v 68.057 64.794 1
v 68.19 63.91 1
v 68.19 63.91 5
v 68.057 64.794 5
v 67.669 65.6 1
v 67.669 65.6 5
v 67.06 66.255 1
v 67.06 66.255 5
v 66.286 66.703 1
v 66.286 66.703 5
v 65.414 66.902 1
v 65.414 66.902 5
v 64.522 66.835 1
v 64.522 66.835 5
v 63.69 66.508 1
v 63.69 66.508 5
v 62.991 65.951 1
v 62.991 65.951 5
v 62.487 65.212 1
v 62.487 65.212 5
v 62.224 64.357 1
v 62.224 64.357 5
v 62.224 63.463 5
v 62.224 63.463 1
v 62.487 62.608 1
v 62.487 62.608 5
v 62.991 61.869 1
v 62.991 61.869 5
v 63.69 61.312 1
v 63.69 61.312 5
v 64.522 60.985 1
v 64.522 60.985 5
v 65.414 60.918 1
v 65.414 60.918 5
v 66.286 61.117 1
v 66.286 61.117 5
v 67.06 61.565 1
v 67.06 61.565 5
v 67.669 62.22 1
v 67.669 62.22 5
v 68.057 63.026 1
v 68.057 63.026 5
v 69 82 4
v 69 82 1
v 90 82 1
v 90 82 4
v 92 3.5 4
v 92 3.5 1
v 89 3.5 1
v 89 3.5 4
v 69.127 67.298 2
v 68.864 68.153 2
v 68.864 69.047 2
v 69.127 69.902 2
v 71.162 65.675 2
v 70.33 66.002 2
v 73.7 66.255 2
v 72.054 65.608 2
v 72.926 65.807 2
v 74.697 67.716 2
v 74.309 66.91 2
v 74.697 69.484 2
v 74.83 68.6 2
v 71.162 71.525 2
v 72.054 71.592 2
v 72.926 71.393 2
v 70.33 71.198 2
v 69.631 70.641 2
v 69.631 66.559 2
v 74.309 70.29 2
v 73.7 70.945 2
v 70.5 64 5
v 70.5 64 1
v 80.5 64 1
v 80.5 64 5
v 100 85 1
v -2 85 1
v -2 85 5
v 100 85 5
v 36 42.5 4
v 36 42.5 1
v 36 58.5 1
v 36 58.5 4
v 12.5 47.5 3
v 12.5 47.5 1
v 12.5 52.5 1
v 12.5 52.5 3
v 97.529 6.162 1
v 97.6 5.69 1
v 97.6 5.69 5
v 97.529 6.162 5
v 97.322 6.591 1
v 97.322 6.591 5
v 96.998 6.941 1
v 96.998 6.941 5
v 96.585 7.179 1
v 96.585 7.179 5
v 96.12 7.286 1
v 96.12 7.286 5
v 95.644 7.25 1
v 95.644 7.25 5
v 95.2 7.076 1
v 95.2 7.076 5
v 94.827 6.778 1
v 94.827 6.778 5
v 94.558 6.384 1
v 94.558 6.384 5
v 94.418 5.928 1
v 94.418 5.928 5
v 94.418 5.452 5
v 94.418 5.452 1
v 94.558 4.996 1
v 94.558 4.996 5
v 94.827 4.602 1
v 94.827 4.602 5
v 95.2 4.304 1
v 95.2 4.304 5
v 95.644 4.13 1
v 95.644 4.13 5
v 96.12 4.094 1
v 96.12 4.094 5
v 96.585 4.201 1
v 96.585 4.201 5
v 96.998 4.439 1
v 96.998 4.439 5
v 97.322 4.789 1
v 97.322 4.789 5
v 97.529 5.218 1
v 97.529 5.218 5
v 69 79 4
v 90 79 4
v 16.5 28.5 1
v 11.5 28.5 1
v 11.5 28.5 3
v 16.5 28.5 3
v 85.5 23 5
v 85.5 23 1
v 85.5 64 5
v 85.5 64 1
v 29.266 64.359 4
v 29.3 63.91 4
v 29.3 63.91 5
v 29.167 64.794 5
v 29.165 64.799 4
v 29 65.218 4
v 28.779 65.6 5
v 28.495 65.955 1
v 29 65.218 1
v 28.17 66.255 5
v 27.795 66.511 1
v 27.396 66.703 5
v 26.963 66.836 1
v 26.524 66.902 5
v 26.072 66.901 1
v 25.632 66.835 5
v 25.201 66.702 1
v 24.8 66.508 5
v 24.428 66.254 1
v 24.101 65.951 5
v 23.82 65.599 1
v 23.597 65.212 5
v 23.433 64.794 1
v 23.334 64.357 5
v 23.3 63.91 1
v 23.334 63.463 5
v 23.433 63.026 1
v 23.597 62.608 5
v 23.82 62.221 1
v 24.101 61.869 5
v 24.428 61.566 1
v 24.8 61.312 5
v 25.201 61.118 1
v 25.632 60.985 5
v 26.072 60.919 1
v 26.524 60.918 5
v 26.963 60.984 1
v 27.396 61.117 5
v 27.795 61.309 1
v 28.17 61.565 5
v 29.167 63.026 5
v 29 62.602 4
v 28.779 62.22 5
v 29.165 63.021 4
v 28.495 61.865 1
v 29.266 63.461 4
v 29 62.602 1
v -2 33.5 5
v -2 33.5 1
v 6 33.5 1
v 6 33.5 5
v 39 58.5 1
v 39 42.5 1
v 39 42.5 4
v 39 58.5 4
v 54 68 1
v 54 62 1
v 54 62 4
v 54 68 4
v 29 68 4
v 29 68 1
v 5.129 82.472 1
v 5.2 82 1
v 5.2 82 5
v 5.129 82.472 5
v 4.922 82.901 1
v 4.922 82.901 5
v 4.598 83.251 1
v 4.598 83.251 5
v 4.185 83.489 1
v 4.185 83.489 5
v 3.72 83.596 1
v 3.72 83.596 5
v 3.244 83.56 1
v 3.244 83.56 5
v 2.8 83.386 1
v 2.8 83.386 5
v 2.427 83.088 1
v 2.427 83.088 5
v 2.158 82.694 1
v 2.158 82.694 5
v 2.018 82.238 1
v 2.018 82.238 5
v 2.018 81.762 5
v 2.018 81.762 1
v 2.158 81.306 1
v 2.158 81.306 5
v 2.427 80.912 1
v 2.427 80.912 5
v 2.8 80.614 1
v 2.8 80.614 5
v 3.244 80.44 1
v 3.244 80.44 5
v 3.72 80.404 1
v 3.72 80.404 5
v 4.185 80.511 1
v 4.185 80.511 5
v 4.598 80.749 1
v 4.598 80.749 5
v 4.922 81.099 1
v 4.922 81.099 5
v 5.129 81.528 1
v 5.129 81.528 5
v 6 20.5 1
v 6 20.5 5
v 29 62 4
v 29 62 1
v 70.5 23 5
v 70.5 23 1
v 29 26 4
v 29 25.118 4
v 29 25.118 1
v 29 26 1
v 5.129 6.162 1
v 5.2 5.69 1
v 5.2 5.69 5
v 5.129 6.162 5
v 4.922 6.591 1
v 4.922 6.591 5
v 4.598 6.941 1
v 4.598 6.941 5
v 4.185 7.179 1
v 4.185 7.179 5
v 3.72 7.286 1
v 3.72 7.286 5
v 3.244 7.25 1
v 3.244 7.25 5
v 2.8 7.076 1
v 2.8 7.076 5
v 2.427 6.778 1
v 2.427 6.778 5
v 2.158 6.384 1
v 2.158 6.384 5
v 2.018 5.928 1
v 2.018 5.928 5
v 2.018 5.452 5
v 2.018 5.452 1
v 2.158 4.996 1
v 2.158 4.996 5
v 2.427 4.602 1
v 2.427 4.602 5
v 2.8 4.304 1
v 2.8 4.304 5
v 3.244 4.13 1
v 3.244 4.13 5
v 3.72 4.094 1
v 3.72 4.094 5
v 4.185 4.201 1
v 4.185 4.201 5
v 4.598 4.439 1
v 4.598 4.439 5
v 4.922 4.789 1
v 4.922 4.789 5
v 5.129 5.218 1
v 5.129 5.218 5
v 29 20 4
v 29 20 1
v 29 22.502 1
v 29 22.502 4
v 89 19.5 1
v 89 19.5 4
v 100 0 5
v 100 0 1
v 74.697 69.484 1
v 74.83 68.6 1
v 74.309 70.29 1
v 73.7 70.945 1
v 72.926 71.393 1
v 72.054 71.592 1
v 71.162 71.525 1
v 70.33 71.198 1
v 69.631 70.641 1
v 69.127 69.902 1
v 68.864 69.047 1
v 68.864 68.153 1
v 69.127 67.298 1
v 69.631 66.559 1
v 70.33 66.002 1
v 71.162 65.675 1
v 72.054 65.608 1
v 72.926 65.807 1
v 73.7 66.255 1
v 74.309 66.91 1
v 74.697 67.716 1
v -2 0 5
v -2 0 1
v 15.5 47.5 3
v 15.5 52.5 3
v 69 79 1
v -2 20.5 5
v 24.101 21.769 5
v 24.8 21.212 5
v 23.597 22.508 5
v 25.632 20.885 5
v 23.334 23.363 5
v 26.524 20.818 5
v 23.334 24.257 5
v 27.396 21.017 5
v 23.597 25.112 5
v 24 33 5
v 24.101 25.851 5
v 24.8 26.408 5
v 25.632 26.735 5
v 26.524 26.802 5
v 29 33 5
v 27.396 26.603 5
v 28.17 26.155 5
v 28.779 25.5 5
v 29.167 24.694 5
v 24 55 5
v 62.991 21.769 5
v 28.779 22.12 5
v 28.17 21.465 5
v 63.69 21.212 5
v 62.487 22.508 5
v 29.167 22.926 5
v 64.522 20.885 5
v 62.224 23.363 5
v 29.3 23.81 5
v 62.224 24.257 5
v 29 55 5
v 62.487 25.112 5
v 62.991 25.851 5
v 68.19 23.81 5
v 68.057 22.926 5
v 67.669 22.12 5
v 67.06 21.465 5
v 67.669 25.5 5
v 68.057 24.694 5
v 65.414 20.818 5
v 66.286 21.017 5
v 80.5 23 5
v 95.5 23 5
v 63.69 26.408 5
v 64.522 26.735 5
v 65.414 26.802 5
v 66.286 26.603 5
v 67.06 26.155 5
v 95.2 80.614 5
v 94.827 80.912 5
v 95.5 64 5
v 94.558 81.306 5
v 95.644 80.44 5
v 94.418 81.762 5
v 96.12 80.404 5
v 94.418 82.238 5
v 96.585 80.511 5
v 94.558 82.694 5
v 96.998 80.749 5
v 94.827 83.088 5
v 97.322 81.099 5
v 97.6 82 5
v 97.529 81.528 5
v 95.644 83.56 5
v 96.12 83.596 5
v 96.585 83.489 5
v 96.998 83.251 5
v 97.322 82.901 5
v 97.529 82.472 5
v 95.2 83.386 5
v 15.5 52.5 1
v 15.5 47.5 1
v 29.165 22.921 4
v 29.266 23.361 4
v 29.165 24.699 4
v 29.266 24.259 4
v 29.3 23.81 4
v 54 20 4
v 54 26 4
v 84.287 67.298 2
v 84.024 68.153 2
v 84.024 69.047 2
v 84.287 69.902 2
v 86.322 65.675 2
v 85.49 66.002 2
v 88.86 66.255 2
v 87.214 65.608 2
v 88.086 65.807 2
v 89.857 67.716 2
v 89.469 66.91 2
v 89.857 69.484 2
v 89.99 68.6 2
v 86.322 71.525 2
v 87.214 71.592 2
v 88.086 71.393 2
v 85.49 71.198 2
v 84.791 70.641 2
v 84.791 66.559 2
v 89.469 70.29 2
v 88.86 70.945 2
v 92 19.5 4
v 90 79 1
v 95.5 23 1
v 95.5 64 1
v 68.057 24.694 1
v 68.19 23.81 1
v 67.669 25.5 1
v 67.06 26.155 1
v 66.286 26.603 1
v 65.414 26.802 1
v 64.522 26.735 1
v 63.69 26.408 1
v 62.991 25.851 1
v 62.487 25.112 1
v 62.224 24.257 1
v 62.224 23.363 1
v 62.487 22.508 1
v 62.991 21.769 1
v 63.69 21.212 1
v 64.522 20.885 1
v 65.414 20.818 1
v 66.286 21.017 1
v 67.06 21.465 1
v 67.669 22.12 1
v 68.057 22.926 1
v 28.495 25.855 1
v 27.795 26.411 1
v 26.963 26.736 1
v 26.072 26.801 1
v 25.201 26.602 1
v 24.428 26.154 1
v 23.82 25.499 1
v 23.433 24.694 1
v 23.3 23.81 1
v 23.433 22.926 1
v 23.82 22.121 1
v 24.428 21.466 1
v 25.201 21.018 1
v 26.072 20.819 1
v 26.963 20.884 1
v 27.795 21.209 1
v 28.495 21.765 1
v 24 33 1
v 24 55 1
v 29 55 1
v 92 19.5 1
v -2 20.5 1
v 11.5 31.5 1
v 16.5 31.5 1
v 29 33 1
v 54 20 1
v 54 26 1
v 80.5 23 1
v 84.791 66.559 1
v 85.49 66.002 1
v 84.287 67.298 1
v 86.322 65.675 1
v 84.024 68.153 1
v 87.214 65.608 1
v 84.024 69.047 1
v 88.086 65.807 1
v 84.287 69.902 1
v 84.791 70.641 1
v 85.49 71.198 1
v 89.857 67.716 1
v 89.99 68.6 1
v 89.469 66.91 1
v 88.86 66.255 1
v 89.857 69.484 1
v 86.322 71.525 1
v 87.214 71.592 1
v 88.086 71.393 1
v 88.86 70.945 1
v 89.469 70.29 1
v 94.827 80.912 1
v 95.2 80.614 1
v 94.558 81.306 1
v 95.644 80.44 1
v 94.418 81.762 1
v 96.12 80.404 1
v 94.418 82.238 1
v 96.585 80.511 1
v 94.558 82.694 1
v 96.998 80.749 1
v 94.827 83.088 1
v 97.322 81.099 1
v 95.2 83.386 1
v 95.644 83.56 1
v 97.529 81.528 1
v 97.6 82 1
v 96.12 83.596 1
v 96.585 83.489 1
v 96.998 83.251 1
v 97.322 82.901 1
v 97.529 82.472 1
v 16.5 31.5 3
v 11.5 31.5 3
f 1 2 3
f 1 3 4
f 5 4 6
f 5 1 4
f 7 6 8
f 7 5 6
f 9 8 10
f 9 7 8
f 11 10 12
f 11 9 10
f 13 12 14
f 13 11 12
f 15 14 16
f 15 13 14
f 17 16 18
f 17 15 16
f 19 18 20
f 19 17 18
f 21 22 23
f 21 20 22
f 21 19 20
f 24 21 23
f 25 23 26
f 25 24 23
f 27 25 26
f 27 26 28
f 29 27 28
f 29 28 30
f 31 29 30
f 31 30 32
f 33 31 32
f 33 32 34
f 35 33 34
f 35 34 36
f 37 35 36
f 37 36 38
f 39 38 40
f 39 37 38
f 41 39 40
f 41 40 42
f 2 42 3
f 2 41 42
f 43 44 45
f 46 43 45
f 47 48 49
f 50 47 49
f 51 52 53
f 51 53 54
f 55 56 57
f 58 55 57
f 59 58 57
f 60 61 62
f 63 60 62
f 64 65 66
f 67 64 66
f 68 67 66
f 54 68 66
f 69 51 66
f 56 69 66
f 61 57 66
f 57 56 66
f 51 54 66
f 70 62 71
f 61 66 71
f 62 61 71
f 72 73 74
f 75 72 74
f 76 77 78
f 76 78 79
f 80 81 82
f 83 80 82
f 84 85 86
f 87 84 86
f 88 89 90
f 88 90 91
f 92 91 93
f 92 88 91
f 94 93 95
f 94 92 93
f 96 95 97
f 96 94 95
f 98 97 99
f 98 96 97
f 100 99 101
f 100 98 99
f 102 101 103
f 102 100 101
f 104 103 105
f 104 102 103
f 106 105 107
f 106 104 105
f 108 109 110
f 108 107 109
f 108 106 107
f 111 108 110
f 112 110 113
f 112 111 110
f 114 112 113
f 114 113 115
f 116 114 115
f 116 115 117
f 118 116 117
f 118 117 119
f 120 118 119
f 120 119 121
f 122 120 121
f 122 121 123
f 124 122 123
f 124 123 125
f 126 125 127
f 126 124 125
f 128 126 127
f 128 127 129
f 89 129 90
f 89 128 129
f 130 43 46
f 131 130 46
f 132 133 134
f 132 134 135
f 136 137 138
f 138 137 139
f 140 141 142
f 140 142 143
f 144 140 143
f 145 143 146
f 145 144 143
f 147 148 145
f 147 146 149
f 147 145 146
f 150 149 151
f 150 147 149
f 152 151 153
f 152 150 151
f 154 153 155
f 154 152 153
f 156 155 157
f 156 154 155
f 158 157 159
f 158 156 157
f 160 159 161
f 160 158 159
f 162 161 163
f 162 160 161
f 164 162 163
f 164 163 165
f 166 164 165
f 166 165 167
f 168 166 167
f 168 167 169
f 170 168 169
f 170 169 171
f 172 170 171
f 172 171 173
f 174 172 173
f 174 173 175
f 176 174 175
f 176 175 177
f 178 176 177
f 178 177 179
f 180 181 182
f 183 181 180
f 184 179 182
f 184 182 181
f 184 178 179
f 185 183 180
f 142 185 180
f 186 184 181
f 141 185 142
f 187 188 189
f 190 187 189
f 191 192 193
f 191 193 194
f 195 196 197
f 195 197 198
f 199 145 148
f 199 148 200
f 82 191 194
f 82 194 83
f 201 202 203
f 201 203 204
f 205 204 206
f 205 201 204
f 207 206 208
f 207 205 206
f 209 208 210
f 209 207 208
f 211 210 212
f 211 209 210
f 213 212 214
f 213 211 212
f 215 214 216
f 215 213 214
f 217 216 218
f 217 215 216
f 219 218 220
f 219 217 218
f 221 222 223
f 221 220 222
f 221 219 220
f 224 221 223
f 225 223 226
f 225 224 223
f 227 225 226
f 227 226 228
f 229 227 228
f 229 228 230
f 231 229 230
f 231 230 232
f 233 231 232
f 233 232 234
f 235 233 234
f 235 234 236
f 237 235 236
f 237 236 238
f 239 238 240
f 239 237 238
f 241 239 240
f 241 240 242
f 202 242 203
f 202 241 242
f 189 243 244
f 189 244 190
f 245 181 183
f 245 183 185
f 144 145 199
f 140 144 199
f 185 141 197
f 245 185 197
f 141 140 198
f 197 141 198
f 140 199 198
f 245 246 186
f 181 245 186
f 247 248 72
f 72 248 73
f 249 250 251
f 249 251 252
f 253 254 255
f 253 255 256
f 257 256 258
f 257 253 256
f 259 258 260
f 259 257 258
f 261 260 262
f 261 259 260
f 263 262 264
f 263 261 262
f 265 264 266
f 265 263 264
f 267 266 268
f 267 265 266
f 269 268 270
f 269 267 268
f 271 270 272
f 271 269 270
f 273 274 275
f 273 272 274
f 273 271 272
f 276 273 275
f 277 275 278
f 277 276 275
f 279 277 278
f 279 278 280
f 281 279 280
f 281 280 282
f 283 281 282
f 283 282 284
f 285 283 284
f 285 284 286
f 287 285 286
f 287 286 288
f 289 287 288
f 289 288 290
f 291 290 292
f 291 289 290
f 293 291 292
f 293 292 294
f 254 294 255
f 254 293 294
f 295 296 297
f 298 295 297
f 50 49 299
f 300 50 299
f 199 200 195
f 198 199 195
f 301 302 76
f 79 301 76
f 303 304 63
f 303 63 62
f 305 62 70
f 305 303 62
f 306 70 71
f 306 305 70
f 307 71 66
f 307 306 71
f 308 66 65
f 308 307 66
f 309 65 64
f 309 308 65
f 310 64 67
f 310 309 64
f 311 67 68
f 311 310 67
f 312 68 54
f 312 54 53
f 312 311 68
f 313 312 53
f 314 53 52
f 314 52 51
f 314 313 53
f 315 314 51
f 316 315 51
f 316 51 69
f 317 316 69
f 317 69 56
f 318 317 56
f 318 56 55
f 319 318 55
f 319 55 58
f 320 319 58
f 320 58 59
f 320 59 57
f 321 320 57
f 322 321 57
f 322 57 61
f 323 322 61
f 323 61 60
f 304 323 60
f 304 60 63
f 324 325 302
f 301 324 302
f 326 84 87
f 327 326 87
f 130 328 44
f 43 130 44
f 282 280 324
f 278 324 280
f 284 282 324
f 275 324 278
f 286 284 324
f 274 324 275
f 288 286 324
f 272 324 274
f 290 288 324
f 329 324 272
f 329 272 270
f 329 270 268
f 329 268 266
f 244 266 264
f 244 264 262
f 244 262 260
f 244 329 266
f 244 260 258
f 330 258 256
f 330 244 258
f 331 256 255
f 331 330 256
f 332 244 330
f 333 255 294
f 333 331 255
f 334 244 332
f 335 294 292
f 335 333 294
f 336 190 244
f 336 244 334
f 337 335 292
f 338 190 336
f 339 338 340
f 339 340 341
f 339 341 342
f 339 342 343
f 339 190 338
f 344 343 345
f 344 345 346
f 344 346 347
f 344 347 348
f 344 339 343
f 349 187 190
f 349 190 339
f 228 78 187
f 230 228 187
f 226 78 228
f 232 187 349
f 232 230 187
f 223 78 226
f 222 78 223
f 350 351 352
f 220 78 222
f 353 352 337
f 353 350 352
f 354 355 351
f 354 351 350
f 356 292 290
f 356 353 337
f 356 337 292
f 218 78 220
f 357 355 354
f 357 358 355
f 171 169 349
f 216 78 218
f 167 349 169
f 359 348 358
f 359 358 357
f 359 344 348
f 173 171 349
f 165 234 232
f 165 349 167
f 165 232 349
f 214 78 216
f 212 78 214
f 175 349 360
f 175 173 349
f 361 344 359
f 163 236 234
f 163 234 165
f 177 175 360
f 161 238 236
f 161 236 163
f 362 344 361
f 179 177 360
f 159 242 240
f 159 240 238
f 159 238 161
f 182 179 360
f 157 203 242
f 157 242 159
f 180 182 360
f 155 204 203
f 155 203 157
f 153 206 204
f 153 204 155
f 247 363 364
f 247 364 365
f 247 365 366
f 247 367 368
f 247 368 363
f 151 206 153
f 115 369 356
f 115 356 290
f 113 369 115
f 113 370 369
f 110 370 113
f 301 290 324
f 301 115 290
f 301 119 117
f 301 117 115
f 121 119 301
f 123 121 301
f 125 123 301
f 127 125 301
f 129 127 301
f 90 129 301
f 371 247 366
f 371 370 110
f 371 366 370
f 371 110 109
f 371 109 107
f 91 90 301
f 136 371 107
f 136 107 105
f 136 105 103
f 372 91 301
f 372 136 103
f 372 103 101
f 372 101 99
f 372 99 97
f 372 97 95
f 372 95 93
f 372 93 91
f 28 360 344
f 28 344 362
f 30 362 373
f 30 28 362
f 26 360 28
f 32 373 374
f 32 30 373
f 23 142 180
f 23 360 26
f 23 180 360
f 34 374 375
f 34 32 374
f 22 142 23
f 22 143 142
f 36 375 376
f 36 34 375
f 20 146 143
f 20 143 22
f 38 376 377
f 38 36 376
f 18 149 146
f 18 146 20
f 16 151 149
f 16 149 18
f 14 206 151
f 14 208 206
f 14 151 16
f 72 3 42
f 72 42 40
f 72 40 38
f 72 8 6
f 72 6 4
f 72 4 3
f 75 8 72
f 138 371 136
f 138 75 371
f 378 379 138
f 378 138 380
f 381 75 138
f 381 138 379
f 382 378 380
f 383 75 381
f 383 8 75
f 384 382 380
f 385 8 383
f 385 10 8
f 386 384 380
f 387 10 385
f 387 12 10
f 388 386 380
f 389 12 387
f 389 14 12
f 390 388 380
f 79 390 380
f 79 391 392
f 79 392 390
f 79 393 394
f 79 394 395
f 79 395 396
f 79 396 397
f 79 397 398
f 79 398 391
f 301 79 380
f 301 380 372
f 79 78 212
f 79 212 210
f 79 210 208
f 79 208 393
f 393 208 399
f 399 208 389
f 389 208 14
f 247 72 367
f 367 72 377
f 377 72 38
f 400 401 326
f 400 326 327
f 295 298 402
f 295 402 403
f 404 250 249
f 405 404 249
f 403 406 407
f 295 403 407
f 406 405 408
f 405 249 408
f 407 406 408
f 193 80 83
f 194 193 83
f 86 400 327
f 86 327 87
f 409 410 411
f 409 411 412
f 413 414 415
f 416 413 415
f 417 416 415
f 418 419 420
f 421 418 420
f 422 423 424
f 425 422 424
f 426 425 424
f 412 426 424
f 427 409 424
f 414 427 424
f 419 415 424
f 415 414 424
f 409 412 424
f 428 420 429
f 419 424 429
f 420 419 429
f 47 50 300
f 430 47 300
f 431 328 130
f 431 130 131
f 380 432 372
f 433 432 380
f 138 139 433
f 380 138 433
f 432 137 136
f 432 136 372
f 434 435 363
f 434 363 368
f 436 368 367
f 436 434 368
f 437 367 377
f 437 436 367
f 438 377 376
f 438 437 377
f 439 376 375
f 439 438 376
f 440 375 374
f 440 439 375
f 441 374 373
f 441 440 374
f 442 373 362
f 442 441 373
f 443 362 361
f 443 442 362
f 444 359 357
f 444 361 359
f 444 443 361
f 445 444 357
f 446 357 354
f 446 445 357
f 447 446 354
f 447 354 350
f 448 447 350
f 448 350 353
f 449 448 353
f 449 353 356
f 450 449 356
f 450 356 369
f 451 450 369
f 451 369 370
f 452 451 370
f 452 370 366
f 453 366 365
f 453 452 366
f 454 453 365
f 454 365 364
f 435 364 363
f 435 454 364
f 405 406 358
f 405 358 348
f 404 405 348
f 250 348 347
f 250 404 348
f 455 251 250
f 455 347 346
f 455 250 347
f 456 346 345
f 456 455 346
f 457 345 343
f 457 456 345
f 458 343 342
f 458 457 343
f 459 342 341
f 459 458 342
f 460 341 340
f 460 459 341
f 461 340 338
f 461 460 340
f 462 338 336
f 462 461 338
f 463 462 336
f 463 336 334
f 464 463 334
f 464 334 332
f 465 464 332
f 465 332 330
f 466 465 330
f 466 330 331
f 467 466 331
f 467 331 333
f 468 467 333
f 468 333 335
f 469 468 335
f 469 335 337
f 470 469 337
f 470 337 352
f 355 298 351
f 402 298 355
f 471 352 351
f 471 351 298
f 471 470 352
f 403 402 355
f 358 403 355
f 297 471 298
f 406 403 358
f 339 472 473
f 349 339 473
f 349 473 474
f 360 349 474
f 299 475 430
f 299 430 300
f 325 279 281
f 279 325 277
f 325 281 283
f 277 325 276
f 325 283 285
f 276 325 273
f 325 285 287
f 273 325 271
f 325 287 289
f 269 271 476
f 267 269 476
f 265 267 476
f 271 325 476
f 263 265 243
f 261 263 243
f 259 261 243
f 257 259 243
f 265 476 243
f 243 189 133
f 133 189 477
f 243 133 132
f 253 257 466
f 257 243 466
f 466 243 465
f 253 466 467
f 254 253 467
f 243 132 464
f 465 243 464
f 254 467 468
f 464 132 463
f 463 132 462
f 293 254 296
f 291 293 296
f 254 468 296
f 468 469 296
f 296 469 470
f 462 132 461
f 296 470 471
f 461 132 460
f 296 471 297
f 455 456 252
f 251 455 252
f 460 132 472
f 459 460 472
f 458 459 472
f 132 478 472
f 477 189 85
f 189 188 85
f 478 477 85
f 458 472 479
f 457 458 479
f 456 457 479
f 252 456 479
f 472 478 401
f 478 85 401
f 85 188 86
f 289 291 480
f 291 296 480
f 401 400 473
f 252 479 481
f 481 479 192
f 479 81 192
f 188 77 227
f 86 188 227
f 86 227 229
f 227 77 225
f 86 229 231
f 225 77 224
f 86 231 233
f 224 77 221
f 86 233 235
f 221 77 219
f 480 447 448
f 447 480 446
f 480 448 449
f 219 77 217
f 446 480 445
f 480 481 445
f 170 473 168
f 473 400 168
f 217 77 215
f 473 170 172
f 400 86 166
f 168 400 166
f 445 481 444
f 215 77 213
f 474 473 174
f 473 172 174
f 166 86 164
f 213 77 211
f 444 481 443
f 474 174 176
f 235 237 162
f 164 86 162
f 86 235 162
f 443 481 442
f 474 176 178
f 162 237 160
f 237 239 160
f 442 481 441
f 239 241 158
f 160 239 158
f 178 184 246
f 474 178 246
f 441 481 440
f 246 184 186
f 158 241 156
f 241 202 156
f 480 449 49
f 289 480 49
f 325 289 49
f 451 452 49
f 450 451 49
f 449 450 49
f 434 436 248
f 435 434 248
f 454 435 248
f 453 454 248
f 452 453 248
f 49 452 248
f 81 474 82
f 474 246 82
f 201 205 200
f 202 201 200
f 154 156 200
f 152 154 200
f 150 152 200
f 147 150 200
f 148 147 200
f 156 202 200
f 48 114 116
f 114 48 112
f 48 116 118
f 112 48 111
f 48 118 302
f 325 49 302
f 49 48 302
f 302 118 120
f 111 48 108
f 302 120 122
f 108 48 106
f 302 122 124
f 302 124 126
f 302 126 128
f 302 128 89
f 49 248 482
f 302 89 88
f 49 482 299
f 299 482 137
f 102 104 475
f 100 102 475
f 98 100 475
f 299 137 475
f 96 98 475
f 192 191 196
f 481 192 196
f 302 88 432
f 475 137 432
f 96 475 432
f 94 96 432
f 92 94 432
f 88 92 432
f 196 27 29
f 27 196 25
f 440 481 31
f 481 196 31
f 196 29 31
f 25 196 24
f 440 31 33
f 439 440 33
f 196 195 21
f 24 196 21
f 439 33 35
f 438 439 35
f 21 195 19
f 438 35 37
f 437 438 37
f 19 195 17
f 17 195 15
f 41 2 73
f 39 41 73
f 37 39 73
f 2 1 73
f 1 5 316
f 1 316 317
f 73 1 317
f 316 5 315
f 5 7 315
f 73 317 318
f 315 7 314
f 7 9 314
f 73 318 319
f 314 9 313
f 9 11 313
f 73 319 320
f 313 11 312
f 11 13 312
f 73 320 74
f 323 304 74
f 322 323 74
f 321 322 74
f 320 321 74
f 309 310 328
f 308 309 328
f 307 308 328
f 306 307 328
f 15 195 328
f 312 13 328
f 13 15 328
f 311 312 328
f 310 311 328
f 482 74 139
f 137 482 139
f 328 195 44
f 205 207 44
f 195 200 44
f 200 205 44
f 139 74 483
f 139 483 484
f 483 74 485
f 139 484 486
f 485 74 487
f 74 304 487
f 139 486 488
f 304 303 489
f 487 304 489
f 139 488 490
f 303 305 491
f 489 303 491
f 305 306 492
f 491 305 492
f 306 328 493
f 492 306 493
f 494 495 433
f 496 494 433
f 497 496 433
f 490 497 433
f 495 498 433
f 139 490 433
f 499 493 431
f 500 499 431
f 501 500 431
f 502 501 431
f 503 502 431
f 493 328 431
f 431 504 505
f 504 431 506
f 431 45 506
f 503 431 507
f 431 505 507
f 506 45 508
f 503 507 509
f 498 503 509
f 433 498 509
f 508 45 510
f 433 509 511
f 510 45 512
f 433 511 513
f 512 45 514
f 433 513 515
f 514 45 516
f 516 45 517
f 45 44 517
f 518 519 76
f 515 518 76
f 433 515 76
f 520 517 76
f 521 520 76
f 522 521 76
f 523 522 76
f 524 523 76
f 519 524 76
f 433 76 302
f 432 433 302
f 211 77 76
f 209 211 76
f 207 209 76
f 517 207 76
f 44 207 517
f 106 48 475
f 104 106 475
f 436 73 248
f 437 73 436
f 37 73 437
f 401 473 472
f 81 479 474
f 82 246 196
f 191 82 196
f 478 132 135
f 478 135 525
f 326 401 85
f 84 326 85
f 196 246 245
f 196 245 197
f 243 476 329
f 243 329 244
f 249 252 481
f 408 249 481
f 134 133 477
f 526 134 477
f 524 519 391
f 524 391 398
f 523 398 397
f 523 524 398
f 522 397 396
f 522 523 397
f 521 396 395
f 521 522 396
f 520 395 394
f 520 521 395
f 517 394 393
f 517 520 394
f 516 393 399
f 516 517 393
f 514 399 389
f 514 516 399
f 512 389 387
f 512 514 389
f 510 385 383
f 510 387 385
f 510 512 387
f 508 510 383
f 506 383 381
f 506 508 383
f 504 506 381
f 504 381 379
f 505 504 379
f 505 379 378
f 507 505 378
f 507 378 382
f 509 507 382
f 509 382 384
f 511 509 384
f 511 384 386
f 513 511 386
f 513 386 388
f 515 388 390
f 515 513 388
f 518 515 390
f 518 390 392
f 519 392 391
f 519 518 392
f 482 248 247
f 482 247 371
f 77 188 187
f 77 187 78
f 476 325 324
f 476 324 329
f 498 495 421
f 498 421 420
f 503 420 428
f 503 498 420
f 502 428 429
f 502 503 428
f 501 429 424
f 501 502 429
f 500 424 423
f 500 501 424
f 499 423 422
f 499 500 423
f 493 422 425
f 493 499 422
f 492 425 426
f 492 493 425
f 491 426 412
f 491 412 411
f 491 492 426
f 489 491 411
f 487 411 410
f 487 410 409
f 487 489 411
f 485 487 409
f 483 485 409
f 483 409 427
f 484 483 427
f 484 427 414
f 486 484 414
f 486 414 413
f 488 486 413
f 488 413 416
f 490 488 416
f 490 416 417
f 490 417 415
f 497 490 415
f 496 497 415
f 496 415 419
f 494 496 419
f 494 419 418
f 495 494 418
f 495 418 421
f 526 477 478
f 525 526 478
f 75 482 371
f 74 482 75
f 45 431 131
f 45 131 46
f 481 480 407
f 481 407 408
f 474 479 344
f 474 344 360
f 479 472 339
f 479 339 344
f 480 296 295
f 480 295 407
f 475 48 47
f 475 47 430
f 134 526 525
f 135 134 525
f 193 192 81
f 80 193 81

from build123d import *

# Parameters (mm, degrees)
CYLINDER010_R          = 1.6
CYLINDER010_DEPTH      = 10
CYLINDER012_R          = 1.6
CYLINDER012_DEPTH      = 10
CYLINDER011_R          = 1.6
CYLINDER011_DEPTH      = 10
CYLINDER013_R          = 1.6
CYLINDER013_DEPTH      = 10
BOX014_W               = 16
BOX014_H               = 3
BOX014_DEPTH           = 4
BOX014_PLACEMENT_ANGLE = 90
BOX018_W               = 5
BOX018_H               = 3
BOX018_DEPTH           = 3
BOX018_PLACEMENT_ANGLE = 90
BOX013_W               = 16
BOX013_H               = 3
BOX013_DEPTH           = 4
BOX013_PLACEMENT_ANGLE = 90
BOX015_W               = 25
BOX015_H               = 6
BOX015_DEPTH           = 4
BOX016_W               = 25
BOX016_H               = 6
BOX016_DEPTH           = 4
BOX017_W               = 5
BOX017_H               = 3
BOX017_DEPTH           = 3
CYLINDER004_R          = 3
CYLINDER004_DEPTH      = 2
CYLINDER005_R          = 3
CYLINDER005_DEPTH      = 2
CYLINDER008_R          = 1.6
CYLINDER008_DEPTH      = 10
CYLINDER007_R          = 1.6
CYLINDER007_DEPTH      = 10
CYLINDER009_R          = 1.6
CYLINDER009_DEPTH      = 10
CYLINDER006_R          = 1.6
CYLINDER006_DEPTH      = 10
BOX012_W               = 21
BOX012_H               = 3
BOX012_DEPTH           = 4
CYLINDER001_R          = 3
CYLINDER001_DEPTH      = 10
CYLINDER002_R          = 3
CYLINDER002_DEPTH      = 10
CYLINDER_R             = 3
CYLINDER_DEPTH         = 10
CYLINDER003_R          = 3
CYLINDER003_DEPTH      = 10
BOX011_W               = 5
BOX011_H               = 22
BOX011_DEPTH           = 10
BOX009_W               = 10
BOX009_H               = 41
BOX009_DEPTH           = 10
BOX010_W               = 10
BOX010_H               = 41
BOX010_DEPTH           = 10
BOX006_W               = 17
BOX006_H               = 13
BOX006_DEPTH           = 10
BOX_W                  = 102
BOX_H                  = 85
BOX_DEPTH              = 4


with BuildPart() as cylinder010:
    # Cylinder010 → Cylinder010 (new body)
    with BuildSketch(Plane(origin=(3.6, 5.69, 0), x_dir=(1, 0, 0), z_dir=(0, 0, 1))):
        Circle(CYLINDER010_R)
    extrude(amount=CYLINDER010_DEPTH)


with BuildPart() as cylinder012:
    # Cylinder012 → Cylinder012 (new body)
    with BuildSketch(Plane(origin=(96, 5.69, 0), x_dir=(1, 0, 0), z_dir=(0, 0, 1))):
        Circle(CYLINDER012_R)
    extrude(amount=CYLINDER012_DEPTH)


with BuildPart() as cylinder011:
    # Cylinder011 → Cylinder011 (new body)
    with BuildSketch(Plane(origin=(3.6, 82, 0), x_dir=(1, 0, 0), z_dir=(0, 0, 1))):
        Circle(CYLINDER011_R)
    extrude(amount=CYLINDER011_DEPTH)


with BuildPart() as cylinder013:
    # Cylinder013 → Cylinder013 (new body)
    with BuildSketch(Plane(origin=(96, 82, 0), x_dir=(1, 0, 0), z_dir=(0, 0, 1))):
        Circle(CYLINDER013_R)
    extrude(amount=CYLINDER013_DEPTH)


with BuildPart() as pins_sd_card_reader:
    # Box014 → Box014 (new body)
    with BuildSketch(Plane.XY):
        with Locations((8, 1.5)):
            Rectangle(BOX014_W, BOX014_H)
    extrude(amount=BOX014_DEPTH)


with BuildPart() as pins_sd_card_reader_1:
    # Box014 placement: moved
    add(pins_sd_card_reader.part.moved(Location((39, 42.5, 0))).rotate(Axis((39, 42.5, 0), (0, 0, 1)), BOX014_PLACEMENT_ANGLE))


with BuildPart() as smd_capacitor:
    # Box018 → Box018 (new body)
    with BuildSketch(Plane.XY):
        with Locations((2.5, 1.5)):
            Rectangle(BOX018_W, BOX018_H)
    extrude(amount=BOX018_DEPTH)


with BuildPart() as smd_capacitor_1:
    # Box018 placement: moved
    add(smd_capacitor.part.moved(Location((15.5, 47.5, 0))).rotate(Axis((15.5, 47.5, 0), (0, 0, 1)), BOX018_PLACEMENT_ANGLE))


with BuildPart() as pins_bluetooth:
    # Box013 → Box013 (new body)
    with BuildSketch(Plane.XY):
        with Locations((8, 1.5)):
            Rectangle(BOX013_W, BOX013_H)
    extrude(amount=BOX013_DEPTH)


with BuildPart() as pins_bluetooth_1:
    # Box013 placement: moved
    add(pins_bluetooth.part.moved(Location((92, 3.5, 0))).rotate(Axis((92, 3.5, 0), (0, 0, 1)), BOX013_PLACEMENT_ANGLE))


with BuildPart() as box015:
    # Box015 → Box015 (new body)
    with BuildSketch(Plane(origin=(29, 62, 0), x_dir=(1, 0, 0), z_dir=(0, 0, 1))):
        with Locations((12.5, 3)):
            Rectangle(BOX015_W, BOX015_H)
    extrude(amount=BOX015_DEPTH)


with BuildPart() as box016:
    # Box016 → Box016 (new body)
    with BuildSketch(Plane(origin=(29, 20, 0), x_dir=(1, 0, 0), z_dir=(0, 0, 1))):
        with Locations((12.5, 3)):
            Rectangle(BOX016_W, BOX016_H)
    extrude(amount=BOX016_DEPTH)


with BuildPart() as smd_resistor:
    # Box017 → Box017 (new body)
    with BuildSketch(Plane(origin=(11.5, 28.5, 0), x_dir=(1, 0, 0), z_dir=(0, 0, 1))):
        with Locations((2.5, 1.5)):
            Rectangle(BOX017_W, BOX017_H)
    extrude(amount=BOX017_DEPTH)


with BuildPart() as cylinder004:
    # Cylinder004 → Cylinder004 (new body)
    with BuildSketch(Plane(origin=(86.99, 68.6, 0), x_dir=(1, 0, 0), z_dir=(0, 0, 1))):
        Circle(CYLINDER004_R)
    extrude(amount=CYLINDER004_DEPTH)


with BuildPart() as cylinder005:
    # Cylinder005 → Cylinder005 (new body)
    with BuildSketch(Plane(origin=(71.83, 68.6, 0), x_dir=(1, 0, 0), z_dir=(0, 0, 1))):
        Circle(CYLINDER005_R)
    extrude(amount=CYLINDER005_DEPTH)


with BuildPart() as cylinder008:
    # Cylinder008 → Cylinder008 (new body)
    with BuildSketch(Plane(origin=(96, 5.69, 0), x_dir=(1, 0, 0), z_dir=(0, 0, 1))):
        Circle(CYLINDER008_R)
    extrude(amount=CYLINDER008_DEPTH)


with BuildPart() as cylinder007:
    # Cylinder007 → Cylinder007 (new body)
    with BuildSketch(Plane(origin=(3.6, 82, 0), x_dir=(1, 0, 0), z_dir=(0, 0, 1))):
        Circle(CYLINDER007_R)
    extrude(amount=CYLINDER007_DEPTH)


with BuildPart() as cylinder009:
    # Cylinder009 → Cylinder009 (new body)
    with BuildSketch(Plane(origin=(96, 82, 0), x_dir=(1, 0, 0), z_dir=(0, 0, 1))):
        Circle(CYLINDER009_R)
    extrude(amount=CYLINDER009_DEPTH)


with BuildPart() as board_holes:
    # Cylinder006 → Cylinder006 (new body)
    with BuildSketch(Plane(origin=(3.6, 5.69, 0), x_dir=(1, 0, 0), z_dir=(0, 0, 1))):
        Circle(CYLINDER006_R)
    extrude(amount=CYLINDER006_DEPTH)

    # Fusion004: union Cylinder008, Cylinder007, Cylinder009
    add(cylinder008.part)
    add(cylinder007.part)
    add(cylinder009.part)


with BuildPart() as pins_smds_and_holes:
    # Box012 → Box012 (new body)
    with BuildSketch(Plane(origin=(69, 79, 0), x_dir=(1, 0, 0), z_dir=(0, 0, 1))):
        with Locations((10.5, 1.5)):
            Rectangle(BOX012_W, BOX012_H)
    extrude(amount=BOX012_DEPTH)

    # Fusion003: union pins_sd card reader, SMD capacitor, pins_bluetooth, Box015, Box016, SMD resistor, Cylinder004, Cylinder005, board holes
    add(pins_sd_card_reader_1.part)
    add(smd_capacitor_1.part)
    add(pins_bluetooth_1.part)
    add(box015.part)
    add(box016.part)
    add(smd_resistor.part)
    add(cylinder004.part)
    add(cylinder005.part)
    add(board_holes.part)

    # Fusion005: union Cylinder010, Cylinder012, Cylinder011, Cylinder013
    add(cylinder010.part)
    add(cylinder012.part)
    add(cylinder011.part)
    add(cylinder013.part)


with BuildPart() as cylinder001:
    # Cylinder001 → Cylinder001 (new body)
    with BuildSketch(Plane(origin=(26.3, 63.91, 0), x_dir=(1, 0, 0), z_dir=(0, 0, 1))):
        Circle(CYLINDER001_R)
    extrude(amount=CYLINDER001_DEPTH)


with BuildPart() as cylinder002:
    # Cylinder002 → Cylinder002 (new body)
    with BuildSketch(Plane(origin=(65.19, 23.81, 0), x_dir=(1, 0, 0), z_dir=(0, 0, 1))):
        Circle(CYLINDER002_R)
    extrude(amount=CYLINDER002_DEPTH)


with BuildPart() as cylinder:
    # Cylinder → Cylinder (new body)
    with BuildSketch(Plane(origin=(26.3, 23.81, 0), x_dir=(1, 0, 0), z_dir=(0, 0, 1))):
        Circle(CYLINDER_R)
    extrude(amount=CYLINDER_DEPTH)


with BuildPart() as cylinder003:
    # Cylinder003 → Cylinder003 (new body)
    with BuildSketch(Plane(origin=(65.19, 63.91, 0), x_dir=(1, 0, 0), z_dir=(0, 0, 1))):
        Circle(CYLINDER003_R)
    extrude(amount=CYLINDER003_DEPTH)


with BuildPart() as screen_holes:
    # Box011 → Box011 (new body)
    with BuildSketch(Plane(origin=(24, 33, 0), x_dir=(1, 0, 0), z_dir=(0, 0, 1))):
        with Locations((2.5, 11)):
            Rectangle(BOX011_W, BOX011_H)
    extrude(amount=BOX011_DEPTH)

    # Fusion002: union Cylinder001, Cylinder002, Cylinder, Cylinder003
    add(cylinder001.part)
    add(cylinder002.part)
    add(cylinder.part)
    add(cylinder003.part)


with BuildPart() as button_array:
    # Box009 → Box009 (new body)
    with BuildSketch(Plane(origin=(70.5, 23, 0), x_dir=(1, 0, 0), z_dir=(0, 0, 1))):
        with Locations((5, 20.5)):
            Rectangle(BOX009_W, BOX009_H)
    extrude(amount=BOX009_DEPTH)


with BuildPart() as button_arrays:
    # Box010 → Box010 (new body)
    with BuildSketch(Plane(origin=(85.5, 23, 0), x_dir=(1, 0, 0), z_dir=(0, 0, 1))):
        with Locations((5, 20.5)):
            Rectangle(BOX010_W, BOX010_H)
    extrude(amount=BOX010_DEPTH)

    # Fusion001: union button array
    add(button_array.part)


with BuildPart() as led_array_connector:
    # Box006 → Box006 (new body)
    with BuildSketch(Plane(origin=(-11, 20.5, 0), x_dir=(1, 0, 0), z_dir=(0, 0, 1))):
        with Locations((8.5, 6.5)):
            Rectangle(BOX006_W, BOX006_H)
    extrude(amount=BOX006_DEPTH)


with BuildPart() as final_top:
    # Box → Box (new body)
    with BuildSketch(Plane(origin=(-2, 0, 1), x_dir=(1, 0, 0), z_dir=(0, 0, 1))):
        with Locations((51, 42.5)):
            Rectangle(BOX_W, BOX_H)
    extrude(amount=BOX_DEPTH)

    # Cut001: cut led array connector
    add(led_array_connector.part, mode=Mode.SUBTRACT)

    # Cut002: cut button arrays
    add(button_arrays.part, mode=Mode.SUBTRACT)

    # Cut003: cut screen holes
    add(screen_holes.part, mode=Mode.SUBTRACT)

    # Cut004: cut pins_SMDs and holes
    add(pins_smds_and_holes.part, mode=Mode.SUBTRACT)


solid = final_top.part
